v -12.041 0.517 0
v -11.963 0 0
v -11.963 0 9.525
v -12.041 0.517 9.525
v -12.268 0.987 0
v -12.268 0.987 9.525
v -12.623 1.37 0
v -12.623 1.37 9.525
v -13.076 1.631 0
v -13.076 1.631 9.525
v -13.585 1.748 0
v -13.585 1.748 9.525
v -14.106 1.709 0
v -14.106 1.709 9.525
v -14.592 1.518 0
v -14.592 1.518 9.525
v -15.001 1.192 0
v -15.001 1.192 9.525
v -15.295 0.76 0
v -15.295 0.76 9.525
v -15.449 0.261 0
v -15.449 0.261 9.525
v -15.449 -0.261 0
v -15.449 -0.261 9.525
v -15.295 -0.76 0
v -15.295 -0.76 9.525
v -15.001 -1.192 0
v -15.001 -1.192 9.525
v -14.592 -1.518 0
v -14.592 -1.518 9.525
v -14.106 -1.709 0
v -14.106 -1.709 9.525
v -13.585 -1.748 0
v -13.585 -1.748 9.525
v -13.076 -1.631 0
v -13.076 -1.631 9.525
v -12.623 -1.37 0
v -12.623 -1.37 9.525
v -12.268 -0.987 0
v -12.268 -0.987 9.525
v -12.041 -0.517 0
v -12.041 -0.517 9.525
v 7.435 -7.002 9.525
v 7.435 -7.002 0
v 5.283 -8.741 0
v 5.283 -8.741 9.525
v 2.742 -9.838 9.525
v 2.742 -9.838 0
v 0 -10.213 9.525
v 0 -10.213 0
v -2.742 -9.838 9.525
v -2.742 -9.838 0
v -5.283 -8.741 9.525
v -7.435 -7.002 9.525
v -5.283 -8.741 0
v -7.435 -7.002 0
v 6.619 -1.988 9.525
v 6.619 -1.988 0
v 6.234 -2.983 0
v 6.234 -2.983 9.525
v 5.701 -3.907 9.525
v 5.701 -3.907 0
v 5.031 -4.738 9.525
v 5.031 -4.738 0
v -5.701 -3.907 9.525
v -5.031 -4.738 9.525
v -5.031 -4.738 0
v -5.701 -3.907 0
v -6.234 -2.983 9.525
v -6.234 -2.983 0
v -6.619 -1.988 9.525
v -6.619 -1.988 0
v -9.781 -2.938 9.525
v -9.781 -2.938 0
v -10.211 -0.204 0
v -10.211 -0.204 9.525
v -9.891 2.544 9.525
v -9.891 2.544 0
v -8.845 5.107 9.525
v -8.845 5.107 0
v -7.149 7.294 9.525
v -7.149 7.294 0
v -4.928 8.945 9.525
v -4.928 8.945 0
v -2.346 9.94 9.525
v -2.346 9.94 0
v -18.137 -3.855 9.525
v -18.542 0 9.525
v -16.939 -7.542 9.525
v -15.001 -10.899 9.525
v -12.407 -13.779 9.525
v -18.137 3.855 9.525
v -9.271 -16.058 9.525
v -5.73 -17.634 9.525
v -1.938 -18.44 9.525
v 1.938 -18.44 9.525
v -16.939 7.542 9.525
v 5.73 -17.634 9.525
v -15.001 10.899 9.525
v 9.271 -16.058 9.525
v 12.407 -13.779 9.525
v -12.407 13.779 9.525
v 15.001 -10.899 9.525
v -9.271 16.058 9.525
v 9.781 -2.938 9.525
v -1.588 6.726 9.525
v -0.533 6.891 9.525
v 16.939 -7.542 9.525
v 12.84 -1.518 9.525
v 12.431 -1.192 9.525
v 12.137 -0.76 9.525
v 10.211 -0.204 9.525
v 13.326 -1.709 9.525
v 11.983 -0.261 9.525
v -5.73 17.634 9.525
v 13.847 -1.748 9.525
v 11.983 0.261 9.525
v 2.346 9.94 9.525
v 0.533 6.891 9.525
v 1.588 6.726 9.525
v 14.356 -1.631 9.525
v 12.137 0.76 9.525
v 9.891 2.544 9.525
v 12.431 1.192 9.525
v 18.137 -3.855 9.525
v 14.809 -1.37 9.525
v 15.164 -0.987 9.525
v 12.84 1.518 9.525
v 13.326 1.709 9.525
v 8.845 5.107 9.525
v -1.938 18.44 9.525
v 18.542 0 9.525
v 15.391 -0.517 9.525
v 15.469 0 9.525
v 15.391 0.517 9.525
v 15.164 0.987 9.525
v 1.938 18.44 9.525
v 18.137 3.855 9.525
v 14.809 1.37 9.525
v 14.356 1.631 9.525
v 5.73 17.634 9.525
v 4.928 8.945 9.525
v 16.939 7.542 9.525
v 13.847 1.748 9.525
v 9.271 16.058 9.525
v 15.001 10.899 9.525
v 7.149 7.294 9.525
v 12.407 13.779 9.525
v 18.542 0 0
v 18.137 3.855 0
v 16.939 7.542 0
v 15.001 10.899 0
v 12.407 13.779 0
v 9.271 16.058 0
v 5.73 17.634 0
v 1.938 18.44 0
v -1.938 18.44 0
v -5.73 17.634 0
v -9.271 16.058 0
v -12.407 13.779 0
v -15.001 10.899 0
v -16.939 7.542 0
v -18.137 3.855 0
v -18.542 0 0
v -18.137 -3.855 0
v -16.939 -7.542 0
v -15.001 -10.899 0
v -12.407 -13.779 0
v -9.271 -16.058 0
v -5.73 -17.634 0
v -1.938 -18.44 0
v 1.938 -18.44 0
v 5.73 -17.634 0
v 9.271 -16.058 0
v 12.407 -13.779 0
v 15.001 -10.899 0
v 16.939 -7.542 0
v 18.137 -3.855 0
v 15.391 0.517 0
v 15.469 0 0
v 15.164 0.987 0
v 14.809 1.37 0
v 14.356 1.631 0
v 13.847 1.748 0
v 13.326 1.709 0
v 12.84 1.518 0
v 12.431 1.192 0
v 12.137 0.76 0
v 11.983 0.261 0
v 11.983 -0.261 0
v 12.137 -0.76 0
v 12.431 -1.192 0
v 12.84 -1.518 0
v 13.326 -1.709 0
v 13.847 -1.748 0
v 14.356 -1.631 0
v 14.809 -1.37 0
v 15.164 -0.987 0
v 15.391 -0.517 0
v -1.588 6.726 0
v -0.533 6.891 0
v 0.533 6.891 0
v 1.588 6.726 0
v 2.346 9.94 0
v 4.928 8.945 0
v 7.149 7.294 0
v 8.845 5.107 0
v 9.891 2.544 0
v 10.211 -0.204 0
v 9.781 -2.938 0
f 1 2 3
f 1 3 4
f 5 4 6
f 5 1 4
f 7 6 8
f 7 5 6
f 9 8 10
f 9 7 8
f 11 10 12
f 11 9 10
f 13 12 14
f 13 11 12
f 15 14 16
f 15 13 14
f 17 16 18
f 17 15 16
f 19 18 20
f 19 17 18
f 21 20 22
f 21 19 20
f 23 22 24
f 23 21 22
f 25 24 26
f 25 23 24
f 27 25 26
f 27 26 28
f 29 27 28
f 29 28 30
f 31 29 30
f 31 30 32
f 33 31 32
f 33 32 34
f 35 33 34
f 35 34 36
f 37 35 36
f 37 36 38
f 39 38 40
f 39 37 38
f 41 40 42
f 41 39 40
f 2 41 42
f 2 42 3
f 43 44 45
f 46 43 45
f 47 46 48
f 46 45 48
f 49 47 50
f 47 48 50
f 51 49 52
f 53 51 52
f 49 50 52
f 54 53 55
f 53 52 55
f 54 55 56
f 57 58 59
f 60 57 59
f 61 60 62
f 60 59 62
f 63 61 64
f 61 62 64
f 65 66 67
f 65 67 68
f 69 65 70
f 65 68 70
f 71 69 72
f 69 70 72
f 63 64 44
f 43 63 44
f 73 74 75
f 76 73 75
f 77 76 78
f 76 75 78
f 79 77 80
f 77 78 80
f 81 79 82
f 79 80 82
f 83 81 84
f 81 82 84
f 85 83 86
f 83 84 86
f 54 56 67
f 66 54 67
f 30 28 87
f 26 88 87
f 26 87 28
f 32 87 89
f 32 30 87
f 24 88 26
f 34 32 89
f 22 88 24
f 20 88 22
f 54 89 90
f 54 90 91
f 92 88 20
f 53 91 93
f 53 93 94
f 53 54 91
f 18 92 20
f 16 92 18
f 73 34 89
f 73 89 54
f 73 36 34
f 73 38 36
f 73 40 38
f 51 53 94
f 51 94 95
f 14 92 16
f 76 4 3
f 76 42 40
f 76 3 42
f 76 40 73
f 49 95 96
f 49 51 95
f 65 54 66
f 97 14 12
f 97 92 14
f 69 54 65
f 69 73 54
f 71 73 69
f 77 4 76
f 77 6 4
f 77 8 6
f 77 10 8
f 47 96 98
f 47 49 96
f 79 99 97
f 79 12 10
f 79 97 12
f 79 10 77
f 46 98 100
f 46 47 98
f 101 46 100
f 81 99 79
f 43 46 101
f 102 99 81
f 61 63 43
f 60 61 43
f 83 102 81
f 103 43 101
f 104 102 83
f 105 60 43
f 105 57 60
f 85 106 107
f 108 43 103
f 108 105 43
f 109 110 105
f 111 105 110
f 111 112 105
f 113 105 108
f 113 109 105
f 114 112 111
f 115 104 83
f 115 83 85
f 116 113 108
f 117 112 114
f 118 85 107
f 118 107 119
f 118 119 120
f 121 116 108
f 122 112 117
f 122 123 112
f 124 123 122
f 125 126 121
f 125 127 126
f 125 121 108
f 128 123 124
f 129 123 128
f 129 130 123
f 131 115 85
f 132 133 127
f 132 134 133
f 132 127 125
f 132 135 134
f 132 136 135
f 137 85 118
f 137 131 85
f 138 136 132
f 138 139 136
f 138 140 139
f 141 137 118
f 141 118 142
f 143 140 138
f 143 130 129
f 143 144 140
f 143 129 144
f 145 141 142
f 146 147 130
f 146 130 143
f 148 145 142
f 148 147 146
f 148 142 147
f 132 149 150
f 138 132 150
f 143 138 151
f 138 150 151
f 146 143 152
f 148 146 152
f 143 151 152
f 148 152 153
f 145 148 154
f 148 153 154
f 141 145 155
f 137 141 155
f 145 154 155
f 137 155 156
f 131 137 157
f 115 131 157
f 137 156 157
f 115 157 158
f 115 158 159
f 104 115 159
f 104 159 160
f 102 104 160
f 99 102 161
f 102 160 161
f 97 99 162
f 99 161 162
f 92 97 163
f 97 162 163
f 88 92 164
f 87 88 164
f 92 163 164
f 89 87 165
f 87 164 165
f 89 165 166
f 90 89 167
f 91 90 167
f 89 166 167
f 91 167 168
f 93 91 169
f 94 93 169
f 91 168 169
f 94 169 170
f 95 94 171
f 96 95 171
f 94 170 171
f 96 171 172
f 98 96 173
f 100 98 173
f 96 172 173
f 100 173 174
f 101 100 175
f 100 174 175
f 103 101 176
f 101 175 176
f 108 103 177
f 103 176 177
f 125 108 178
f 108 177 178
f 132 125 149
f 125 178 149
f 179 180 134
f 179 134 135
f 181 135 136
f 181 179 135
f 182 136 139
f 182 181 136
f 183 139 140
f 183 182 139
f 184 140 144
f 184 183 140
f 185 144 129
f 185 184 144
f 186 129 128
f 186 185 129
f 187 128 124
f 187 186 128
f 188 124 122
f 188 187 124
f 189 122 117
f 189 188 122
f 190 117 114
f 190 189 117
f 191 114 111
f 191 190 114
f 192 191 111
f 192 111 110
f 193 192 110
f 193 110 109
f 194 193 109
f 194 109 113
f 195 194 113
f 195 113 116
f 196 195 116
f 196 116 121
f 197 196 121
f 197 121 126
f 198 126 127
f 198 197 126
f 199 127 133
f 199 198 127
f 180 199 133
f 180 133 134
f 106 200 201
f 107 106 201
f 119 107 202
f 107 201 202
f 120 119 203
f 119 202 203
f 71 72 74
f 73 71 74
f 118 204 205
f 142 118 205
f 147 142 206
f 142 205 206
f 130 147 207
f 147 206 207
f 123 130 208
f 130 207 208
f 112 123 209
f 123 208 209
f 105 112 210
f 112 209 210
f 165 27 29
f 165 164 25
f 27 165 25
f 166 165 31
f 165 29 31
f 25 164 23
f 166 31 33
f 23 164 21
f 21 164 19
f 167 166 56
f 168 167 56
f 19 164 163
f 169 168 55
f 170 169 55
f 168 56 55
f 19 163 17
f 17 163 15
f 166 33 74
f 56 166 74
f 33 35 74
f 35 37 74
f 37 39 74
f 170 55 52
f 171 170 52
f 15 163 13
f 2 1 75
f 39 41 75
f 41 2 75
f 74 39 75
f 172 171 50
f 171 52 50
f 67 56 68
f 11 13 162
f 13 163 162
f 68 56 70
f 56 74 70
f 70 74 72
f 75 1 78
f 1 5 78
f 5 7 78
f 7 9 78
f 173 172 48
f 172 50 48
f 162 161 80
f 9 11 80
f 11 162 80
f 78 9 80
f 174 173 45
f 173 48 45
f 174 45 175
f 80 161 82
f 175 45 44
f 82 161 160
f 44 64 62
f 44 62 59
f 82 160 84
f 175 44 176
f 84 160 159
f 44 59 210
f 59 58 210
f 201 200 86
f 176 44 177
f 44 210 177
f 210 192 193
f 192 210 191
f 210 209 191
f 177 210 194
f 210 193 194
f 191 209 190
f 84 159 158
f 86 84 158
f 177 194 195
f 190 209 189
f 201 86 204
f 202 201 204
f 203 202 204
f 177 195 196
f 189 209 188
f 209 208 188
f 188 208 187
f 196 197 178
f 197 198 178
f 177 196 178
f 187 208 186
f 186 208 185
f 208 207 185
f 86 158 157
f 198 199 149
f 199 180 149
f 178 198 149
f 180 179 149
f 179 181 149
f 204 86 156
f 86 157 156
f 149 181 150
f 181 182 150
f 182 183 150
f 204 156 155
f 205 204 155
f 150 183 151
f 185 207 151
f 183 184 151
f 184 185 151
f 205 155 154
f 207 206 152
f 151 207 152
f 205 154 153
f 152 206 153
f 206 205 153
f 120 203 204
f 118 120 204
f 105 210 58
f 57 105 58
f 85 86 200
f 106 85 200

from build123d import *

# Parameters (mm, degrees)
F0_R     = 18.542
F0_R_2   = 1.7526
F1_DEPTH = 9.525


with BuildPart() as f1:
    # F0 (on Top) → F1 (new body)
    with BuildSketch(Plane.XY):
        Circle(F0_R)
        with BuildLine():
            ThreePointArc((-5.031432, -4.737986), (-5.98522, -3.455569), (-6.618932, -1.988355))
            Line((-6.618932, -1.988355), (-9.781322, -2.93835))
            ThreePointArc((-9.781322, -2.93835), (-8.844836, 5.106569), (-2.345975, 9.940049))
            Line((-2.345975, 9.940049), (-1.5875, 6.726341))
            ThreePointArc((-1.5875, 6.726341), (0, 6.911137), (1.5875, 6.726341))
            Line((1.5875, 6.726341), (2.345975, 9.940049))
            ThreePointArc((2.345975, 9.940049), (8.844836, 5.106569), (9.781322, -2.93835))
            Line((9.781322, -2.93835), (6.618932, -1.988355))
            ThreePointArc((6.618932, -1.988355), (5.98522, -3.455569), (5.031432, -4.737986))
            Line((5.031432, -4.737986), (7.435347, -7.001698))
            ThreePointArc((7.435347, -7.001698), (0, -10.213137), (-7.435347, -7.001698))
            Line((-7.435347, -7.001698), (-5.031432, -4.737986))
        make_face(mode=Mode.SUBTRACT)
        with Locations((-13.716, 0)):
            Circle(F0_R_2, mode=Mode.SUBTRACT)
        with Locations((13.716, 0)):
            Circle(F0_R_2, mode=Mode.SUBTRACT)
    extrude(amount=F1_DEPTH)


solid = f1.part
